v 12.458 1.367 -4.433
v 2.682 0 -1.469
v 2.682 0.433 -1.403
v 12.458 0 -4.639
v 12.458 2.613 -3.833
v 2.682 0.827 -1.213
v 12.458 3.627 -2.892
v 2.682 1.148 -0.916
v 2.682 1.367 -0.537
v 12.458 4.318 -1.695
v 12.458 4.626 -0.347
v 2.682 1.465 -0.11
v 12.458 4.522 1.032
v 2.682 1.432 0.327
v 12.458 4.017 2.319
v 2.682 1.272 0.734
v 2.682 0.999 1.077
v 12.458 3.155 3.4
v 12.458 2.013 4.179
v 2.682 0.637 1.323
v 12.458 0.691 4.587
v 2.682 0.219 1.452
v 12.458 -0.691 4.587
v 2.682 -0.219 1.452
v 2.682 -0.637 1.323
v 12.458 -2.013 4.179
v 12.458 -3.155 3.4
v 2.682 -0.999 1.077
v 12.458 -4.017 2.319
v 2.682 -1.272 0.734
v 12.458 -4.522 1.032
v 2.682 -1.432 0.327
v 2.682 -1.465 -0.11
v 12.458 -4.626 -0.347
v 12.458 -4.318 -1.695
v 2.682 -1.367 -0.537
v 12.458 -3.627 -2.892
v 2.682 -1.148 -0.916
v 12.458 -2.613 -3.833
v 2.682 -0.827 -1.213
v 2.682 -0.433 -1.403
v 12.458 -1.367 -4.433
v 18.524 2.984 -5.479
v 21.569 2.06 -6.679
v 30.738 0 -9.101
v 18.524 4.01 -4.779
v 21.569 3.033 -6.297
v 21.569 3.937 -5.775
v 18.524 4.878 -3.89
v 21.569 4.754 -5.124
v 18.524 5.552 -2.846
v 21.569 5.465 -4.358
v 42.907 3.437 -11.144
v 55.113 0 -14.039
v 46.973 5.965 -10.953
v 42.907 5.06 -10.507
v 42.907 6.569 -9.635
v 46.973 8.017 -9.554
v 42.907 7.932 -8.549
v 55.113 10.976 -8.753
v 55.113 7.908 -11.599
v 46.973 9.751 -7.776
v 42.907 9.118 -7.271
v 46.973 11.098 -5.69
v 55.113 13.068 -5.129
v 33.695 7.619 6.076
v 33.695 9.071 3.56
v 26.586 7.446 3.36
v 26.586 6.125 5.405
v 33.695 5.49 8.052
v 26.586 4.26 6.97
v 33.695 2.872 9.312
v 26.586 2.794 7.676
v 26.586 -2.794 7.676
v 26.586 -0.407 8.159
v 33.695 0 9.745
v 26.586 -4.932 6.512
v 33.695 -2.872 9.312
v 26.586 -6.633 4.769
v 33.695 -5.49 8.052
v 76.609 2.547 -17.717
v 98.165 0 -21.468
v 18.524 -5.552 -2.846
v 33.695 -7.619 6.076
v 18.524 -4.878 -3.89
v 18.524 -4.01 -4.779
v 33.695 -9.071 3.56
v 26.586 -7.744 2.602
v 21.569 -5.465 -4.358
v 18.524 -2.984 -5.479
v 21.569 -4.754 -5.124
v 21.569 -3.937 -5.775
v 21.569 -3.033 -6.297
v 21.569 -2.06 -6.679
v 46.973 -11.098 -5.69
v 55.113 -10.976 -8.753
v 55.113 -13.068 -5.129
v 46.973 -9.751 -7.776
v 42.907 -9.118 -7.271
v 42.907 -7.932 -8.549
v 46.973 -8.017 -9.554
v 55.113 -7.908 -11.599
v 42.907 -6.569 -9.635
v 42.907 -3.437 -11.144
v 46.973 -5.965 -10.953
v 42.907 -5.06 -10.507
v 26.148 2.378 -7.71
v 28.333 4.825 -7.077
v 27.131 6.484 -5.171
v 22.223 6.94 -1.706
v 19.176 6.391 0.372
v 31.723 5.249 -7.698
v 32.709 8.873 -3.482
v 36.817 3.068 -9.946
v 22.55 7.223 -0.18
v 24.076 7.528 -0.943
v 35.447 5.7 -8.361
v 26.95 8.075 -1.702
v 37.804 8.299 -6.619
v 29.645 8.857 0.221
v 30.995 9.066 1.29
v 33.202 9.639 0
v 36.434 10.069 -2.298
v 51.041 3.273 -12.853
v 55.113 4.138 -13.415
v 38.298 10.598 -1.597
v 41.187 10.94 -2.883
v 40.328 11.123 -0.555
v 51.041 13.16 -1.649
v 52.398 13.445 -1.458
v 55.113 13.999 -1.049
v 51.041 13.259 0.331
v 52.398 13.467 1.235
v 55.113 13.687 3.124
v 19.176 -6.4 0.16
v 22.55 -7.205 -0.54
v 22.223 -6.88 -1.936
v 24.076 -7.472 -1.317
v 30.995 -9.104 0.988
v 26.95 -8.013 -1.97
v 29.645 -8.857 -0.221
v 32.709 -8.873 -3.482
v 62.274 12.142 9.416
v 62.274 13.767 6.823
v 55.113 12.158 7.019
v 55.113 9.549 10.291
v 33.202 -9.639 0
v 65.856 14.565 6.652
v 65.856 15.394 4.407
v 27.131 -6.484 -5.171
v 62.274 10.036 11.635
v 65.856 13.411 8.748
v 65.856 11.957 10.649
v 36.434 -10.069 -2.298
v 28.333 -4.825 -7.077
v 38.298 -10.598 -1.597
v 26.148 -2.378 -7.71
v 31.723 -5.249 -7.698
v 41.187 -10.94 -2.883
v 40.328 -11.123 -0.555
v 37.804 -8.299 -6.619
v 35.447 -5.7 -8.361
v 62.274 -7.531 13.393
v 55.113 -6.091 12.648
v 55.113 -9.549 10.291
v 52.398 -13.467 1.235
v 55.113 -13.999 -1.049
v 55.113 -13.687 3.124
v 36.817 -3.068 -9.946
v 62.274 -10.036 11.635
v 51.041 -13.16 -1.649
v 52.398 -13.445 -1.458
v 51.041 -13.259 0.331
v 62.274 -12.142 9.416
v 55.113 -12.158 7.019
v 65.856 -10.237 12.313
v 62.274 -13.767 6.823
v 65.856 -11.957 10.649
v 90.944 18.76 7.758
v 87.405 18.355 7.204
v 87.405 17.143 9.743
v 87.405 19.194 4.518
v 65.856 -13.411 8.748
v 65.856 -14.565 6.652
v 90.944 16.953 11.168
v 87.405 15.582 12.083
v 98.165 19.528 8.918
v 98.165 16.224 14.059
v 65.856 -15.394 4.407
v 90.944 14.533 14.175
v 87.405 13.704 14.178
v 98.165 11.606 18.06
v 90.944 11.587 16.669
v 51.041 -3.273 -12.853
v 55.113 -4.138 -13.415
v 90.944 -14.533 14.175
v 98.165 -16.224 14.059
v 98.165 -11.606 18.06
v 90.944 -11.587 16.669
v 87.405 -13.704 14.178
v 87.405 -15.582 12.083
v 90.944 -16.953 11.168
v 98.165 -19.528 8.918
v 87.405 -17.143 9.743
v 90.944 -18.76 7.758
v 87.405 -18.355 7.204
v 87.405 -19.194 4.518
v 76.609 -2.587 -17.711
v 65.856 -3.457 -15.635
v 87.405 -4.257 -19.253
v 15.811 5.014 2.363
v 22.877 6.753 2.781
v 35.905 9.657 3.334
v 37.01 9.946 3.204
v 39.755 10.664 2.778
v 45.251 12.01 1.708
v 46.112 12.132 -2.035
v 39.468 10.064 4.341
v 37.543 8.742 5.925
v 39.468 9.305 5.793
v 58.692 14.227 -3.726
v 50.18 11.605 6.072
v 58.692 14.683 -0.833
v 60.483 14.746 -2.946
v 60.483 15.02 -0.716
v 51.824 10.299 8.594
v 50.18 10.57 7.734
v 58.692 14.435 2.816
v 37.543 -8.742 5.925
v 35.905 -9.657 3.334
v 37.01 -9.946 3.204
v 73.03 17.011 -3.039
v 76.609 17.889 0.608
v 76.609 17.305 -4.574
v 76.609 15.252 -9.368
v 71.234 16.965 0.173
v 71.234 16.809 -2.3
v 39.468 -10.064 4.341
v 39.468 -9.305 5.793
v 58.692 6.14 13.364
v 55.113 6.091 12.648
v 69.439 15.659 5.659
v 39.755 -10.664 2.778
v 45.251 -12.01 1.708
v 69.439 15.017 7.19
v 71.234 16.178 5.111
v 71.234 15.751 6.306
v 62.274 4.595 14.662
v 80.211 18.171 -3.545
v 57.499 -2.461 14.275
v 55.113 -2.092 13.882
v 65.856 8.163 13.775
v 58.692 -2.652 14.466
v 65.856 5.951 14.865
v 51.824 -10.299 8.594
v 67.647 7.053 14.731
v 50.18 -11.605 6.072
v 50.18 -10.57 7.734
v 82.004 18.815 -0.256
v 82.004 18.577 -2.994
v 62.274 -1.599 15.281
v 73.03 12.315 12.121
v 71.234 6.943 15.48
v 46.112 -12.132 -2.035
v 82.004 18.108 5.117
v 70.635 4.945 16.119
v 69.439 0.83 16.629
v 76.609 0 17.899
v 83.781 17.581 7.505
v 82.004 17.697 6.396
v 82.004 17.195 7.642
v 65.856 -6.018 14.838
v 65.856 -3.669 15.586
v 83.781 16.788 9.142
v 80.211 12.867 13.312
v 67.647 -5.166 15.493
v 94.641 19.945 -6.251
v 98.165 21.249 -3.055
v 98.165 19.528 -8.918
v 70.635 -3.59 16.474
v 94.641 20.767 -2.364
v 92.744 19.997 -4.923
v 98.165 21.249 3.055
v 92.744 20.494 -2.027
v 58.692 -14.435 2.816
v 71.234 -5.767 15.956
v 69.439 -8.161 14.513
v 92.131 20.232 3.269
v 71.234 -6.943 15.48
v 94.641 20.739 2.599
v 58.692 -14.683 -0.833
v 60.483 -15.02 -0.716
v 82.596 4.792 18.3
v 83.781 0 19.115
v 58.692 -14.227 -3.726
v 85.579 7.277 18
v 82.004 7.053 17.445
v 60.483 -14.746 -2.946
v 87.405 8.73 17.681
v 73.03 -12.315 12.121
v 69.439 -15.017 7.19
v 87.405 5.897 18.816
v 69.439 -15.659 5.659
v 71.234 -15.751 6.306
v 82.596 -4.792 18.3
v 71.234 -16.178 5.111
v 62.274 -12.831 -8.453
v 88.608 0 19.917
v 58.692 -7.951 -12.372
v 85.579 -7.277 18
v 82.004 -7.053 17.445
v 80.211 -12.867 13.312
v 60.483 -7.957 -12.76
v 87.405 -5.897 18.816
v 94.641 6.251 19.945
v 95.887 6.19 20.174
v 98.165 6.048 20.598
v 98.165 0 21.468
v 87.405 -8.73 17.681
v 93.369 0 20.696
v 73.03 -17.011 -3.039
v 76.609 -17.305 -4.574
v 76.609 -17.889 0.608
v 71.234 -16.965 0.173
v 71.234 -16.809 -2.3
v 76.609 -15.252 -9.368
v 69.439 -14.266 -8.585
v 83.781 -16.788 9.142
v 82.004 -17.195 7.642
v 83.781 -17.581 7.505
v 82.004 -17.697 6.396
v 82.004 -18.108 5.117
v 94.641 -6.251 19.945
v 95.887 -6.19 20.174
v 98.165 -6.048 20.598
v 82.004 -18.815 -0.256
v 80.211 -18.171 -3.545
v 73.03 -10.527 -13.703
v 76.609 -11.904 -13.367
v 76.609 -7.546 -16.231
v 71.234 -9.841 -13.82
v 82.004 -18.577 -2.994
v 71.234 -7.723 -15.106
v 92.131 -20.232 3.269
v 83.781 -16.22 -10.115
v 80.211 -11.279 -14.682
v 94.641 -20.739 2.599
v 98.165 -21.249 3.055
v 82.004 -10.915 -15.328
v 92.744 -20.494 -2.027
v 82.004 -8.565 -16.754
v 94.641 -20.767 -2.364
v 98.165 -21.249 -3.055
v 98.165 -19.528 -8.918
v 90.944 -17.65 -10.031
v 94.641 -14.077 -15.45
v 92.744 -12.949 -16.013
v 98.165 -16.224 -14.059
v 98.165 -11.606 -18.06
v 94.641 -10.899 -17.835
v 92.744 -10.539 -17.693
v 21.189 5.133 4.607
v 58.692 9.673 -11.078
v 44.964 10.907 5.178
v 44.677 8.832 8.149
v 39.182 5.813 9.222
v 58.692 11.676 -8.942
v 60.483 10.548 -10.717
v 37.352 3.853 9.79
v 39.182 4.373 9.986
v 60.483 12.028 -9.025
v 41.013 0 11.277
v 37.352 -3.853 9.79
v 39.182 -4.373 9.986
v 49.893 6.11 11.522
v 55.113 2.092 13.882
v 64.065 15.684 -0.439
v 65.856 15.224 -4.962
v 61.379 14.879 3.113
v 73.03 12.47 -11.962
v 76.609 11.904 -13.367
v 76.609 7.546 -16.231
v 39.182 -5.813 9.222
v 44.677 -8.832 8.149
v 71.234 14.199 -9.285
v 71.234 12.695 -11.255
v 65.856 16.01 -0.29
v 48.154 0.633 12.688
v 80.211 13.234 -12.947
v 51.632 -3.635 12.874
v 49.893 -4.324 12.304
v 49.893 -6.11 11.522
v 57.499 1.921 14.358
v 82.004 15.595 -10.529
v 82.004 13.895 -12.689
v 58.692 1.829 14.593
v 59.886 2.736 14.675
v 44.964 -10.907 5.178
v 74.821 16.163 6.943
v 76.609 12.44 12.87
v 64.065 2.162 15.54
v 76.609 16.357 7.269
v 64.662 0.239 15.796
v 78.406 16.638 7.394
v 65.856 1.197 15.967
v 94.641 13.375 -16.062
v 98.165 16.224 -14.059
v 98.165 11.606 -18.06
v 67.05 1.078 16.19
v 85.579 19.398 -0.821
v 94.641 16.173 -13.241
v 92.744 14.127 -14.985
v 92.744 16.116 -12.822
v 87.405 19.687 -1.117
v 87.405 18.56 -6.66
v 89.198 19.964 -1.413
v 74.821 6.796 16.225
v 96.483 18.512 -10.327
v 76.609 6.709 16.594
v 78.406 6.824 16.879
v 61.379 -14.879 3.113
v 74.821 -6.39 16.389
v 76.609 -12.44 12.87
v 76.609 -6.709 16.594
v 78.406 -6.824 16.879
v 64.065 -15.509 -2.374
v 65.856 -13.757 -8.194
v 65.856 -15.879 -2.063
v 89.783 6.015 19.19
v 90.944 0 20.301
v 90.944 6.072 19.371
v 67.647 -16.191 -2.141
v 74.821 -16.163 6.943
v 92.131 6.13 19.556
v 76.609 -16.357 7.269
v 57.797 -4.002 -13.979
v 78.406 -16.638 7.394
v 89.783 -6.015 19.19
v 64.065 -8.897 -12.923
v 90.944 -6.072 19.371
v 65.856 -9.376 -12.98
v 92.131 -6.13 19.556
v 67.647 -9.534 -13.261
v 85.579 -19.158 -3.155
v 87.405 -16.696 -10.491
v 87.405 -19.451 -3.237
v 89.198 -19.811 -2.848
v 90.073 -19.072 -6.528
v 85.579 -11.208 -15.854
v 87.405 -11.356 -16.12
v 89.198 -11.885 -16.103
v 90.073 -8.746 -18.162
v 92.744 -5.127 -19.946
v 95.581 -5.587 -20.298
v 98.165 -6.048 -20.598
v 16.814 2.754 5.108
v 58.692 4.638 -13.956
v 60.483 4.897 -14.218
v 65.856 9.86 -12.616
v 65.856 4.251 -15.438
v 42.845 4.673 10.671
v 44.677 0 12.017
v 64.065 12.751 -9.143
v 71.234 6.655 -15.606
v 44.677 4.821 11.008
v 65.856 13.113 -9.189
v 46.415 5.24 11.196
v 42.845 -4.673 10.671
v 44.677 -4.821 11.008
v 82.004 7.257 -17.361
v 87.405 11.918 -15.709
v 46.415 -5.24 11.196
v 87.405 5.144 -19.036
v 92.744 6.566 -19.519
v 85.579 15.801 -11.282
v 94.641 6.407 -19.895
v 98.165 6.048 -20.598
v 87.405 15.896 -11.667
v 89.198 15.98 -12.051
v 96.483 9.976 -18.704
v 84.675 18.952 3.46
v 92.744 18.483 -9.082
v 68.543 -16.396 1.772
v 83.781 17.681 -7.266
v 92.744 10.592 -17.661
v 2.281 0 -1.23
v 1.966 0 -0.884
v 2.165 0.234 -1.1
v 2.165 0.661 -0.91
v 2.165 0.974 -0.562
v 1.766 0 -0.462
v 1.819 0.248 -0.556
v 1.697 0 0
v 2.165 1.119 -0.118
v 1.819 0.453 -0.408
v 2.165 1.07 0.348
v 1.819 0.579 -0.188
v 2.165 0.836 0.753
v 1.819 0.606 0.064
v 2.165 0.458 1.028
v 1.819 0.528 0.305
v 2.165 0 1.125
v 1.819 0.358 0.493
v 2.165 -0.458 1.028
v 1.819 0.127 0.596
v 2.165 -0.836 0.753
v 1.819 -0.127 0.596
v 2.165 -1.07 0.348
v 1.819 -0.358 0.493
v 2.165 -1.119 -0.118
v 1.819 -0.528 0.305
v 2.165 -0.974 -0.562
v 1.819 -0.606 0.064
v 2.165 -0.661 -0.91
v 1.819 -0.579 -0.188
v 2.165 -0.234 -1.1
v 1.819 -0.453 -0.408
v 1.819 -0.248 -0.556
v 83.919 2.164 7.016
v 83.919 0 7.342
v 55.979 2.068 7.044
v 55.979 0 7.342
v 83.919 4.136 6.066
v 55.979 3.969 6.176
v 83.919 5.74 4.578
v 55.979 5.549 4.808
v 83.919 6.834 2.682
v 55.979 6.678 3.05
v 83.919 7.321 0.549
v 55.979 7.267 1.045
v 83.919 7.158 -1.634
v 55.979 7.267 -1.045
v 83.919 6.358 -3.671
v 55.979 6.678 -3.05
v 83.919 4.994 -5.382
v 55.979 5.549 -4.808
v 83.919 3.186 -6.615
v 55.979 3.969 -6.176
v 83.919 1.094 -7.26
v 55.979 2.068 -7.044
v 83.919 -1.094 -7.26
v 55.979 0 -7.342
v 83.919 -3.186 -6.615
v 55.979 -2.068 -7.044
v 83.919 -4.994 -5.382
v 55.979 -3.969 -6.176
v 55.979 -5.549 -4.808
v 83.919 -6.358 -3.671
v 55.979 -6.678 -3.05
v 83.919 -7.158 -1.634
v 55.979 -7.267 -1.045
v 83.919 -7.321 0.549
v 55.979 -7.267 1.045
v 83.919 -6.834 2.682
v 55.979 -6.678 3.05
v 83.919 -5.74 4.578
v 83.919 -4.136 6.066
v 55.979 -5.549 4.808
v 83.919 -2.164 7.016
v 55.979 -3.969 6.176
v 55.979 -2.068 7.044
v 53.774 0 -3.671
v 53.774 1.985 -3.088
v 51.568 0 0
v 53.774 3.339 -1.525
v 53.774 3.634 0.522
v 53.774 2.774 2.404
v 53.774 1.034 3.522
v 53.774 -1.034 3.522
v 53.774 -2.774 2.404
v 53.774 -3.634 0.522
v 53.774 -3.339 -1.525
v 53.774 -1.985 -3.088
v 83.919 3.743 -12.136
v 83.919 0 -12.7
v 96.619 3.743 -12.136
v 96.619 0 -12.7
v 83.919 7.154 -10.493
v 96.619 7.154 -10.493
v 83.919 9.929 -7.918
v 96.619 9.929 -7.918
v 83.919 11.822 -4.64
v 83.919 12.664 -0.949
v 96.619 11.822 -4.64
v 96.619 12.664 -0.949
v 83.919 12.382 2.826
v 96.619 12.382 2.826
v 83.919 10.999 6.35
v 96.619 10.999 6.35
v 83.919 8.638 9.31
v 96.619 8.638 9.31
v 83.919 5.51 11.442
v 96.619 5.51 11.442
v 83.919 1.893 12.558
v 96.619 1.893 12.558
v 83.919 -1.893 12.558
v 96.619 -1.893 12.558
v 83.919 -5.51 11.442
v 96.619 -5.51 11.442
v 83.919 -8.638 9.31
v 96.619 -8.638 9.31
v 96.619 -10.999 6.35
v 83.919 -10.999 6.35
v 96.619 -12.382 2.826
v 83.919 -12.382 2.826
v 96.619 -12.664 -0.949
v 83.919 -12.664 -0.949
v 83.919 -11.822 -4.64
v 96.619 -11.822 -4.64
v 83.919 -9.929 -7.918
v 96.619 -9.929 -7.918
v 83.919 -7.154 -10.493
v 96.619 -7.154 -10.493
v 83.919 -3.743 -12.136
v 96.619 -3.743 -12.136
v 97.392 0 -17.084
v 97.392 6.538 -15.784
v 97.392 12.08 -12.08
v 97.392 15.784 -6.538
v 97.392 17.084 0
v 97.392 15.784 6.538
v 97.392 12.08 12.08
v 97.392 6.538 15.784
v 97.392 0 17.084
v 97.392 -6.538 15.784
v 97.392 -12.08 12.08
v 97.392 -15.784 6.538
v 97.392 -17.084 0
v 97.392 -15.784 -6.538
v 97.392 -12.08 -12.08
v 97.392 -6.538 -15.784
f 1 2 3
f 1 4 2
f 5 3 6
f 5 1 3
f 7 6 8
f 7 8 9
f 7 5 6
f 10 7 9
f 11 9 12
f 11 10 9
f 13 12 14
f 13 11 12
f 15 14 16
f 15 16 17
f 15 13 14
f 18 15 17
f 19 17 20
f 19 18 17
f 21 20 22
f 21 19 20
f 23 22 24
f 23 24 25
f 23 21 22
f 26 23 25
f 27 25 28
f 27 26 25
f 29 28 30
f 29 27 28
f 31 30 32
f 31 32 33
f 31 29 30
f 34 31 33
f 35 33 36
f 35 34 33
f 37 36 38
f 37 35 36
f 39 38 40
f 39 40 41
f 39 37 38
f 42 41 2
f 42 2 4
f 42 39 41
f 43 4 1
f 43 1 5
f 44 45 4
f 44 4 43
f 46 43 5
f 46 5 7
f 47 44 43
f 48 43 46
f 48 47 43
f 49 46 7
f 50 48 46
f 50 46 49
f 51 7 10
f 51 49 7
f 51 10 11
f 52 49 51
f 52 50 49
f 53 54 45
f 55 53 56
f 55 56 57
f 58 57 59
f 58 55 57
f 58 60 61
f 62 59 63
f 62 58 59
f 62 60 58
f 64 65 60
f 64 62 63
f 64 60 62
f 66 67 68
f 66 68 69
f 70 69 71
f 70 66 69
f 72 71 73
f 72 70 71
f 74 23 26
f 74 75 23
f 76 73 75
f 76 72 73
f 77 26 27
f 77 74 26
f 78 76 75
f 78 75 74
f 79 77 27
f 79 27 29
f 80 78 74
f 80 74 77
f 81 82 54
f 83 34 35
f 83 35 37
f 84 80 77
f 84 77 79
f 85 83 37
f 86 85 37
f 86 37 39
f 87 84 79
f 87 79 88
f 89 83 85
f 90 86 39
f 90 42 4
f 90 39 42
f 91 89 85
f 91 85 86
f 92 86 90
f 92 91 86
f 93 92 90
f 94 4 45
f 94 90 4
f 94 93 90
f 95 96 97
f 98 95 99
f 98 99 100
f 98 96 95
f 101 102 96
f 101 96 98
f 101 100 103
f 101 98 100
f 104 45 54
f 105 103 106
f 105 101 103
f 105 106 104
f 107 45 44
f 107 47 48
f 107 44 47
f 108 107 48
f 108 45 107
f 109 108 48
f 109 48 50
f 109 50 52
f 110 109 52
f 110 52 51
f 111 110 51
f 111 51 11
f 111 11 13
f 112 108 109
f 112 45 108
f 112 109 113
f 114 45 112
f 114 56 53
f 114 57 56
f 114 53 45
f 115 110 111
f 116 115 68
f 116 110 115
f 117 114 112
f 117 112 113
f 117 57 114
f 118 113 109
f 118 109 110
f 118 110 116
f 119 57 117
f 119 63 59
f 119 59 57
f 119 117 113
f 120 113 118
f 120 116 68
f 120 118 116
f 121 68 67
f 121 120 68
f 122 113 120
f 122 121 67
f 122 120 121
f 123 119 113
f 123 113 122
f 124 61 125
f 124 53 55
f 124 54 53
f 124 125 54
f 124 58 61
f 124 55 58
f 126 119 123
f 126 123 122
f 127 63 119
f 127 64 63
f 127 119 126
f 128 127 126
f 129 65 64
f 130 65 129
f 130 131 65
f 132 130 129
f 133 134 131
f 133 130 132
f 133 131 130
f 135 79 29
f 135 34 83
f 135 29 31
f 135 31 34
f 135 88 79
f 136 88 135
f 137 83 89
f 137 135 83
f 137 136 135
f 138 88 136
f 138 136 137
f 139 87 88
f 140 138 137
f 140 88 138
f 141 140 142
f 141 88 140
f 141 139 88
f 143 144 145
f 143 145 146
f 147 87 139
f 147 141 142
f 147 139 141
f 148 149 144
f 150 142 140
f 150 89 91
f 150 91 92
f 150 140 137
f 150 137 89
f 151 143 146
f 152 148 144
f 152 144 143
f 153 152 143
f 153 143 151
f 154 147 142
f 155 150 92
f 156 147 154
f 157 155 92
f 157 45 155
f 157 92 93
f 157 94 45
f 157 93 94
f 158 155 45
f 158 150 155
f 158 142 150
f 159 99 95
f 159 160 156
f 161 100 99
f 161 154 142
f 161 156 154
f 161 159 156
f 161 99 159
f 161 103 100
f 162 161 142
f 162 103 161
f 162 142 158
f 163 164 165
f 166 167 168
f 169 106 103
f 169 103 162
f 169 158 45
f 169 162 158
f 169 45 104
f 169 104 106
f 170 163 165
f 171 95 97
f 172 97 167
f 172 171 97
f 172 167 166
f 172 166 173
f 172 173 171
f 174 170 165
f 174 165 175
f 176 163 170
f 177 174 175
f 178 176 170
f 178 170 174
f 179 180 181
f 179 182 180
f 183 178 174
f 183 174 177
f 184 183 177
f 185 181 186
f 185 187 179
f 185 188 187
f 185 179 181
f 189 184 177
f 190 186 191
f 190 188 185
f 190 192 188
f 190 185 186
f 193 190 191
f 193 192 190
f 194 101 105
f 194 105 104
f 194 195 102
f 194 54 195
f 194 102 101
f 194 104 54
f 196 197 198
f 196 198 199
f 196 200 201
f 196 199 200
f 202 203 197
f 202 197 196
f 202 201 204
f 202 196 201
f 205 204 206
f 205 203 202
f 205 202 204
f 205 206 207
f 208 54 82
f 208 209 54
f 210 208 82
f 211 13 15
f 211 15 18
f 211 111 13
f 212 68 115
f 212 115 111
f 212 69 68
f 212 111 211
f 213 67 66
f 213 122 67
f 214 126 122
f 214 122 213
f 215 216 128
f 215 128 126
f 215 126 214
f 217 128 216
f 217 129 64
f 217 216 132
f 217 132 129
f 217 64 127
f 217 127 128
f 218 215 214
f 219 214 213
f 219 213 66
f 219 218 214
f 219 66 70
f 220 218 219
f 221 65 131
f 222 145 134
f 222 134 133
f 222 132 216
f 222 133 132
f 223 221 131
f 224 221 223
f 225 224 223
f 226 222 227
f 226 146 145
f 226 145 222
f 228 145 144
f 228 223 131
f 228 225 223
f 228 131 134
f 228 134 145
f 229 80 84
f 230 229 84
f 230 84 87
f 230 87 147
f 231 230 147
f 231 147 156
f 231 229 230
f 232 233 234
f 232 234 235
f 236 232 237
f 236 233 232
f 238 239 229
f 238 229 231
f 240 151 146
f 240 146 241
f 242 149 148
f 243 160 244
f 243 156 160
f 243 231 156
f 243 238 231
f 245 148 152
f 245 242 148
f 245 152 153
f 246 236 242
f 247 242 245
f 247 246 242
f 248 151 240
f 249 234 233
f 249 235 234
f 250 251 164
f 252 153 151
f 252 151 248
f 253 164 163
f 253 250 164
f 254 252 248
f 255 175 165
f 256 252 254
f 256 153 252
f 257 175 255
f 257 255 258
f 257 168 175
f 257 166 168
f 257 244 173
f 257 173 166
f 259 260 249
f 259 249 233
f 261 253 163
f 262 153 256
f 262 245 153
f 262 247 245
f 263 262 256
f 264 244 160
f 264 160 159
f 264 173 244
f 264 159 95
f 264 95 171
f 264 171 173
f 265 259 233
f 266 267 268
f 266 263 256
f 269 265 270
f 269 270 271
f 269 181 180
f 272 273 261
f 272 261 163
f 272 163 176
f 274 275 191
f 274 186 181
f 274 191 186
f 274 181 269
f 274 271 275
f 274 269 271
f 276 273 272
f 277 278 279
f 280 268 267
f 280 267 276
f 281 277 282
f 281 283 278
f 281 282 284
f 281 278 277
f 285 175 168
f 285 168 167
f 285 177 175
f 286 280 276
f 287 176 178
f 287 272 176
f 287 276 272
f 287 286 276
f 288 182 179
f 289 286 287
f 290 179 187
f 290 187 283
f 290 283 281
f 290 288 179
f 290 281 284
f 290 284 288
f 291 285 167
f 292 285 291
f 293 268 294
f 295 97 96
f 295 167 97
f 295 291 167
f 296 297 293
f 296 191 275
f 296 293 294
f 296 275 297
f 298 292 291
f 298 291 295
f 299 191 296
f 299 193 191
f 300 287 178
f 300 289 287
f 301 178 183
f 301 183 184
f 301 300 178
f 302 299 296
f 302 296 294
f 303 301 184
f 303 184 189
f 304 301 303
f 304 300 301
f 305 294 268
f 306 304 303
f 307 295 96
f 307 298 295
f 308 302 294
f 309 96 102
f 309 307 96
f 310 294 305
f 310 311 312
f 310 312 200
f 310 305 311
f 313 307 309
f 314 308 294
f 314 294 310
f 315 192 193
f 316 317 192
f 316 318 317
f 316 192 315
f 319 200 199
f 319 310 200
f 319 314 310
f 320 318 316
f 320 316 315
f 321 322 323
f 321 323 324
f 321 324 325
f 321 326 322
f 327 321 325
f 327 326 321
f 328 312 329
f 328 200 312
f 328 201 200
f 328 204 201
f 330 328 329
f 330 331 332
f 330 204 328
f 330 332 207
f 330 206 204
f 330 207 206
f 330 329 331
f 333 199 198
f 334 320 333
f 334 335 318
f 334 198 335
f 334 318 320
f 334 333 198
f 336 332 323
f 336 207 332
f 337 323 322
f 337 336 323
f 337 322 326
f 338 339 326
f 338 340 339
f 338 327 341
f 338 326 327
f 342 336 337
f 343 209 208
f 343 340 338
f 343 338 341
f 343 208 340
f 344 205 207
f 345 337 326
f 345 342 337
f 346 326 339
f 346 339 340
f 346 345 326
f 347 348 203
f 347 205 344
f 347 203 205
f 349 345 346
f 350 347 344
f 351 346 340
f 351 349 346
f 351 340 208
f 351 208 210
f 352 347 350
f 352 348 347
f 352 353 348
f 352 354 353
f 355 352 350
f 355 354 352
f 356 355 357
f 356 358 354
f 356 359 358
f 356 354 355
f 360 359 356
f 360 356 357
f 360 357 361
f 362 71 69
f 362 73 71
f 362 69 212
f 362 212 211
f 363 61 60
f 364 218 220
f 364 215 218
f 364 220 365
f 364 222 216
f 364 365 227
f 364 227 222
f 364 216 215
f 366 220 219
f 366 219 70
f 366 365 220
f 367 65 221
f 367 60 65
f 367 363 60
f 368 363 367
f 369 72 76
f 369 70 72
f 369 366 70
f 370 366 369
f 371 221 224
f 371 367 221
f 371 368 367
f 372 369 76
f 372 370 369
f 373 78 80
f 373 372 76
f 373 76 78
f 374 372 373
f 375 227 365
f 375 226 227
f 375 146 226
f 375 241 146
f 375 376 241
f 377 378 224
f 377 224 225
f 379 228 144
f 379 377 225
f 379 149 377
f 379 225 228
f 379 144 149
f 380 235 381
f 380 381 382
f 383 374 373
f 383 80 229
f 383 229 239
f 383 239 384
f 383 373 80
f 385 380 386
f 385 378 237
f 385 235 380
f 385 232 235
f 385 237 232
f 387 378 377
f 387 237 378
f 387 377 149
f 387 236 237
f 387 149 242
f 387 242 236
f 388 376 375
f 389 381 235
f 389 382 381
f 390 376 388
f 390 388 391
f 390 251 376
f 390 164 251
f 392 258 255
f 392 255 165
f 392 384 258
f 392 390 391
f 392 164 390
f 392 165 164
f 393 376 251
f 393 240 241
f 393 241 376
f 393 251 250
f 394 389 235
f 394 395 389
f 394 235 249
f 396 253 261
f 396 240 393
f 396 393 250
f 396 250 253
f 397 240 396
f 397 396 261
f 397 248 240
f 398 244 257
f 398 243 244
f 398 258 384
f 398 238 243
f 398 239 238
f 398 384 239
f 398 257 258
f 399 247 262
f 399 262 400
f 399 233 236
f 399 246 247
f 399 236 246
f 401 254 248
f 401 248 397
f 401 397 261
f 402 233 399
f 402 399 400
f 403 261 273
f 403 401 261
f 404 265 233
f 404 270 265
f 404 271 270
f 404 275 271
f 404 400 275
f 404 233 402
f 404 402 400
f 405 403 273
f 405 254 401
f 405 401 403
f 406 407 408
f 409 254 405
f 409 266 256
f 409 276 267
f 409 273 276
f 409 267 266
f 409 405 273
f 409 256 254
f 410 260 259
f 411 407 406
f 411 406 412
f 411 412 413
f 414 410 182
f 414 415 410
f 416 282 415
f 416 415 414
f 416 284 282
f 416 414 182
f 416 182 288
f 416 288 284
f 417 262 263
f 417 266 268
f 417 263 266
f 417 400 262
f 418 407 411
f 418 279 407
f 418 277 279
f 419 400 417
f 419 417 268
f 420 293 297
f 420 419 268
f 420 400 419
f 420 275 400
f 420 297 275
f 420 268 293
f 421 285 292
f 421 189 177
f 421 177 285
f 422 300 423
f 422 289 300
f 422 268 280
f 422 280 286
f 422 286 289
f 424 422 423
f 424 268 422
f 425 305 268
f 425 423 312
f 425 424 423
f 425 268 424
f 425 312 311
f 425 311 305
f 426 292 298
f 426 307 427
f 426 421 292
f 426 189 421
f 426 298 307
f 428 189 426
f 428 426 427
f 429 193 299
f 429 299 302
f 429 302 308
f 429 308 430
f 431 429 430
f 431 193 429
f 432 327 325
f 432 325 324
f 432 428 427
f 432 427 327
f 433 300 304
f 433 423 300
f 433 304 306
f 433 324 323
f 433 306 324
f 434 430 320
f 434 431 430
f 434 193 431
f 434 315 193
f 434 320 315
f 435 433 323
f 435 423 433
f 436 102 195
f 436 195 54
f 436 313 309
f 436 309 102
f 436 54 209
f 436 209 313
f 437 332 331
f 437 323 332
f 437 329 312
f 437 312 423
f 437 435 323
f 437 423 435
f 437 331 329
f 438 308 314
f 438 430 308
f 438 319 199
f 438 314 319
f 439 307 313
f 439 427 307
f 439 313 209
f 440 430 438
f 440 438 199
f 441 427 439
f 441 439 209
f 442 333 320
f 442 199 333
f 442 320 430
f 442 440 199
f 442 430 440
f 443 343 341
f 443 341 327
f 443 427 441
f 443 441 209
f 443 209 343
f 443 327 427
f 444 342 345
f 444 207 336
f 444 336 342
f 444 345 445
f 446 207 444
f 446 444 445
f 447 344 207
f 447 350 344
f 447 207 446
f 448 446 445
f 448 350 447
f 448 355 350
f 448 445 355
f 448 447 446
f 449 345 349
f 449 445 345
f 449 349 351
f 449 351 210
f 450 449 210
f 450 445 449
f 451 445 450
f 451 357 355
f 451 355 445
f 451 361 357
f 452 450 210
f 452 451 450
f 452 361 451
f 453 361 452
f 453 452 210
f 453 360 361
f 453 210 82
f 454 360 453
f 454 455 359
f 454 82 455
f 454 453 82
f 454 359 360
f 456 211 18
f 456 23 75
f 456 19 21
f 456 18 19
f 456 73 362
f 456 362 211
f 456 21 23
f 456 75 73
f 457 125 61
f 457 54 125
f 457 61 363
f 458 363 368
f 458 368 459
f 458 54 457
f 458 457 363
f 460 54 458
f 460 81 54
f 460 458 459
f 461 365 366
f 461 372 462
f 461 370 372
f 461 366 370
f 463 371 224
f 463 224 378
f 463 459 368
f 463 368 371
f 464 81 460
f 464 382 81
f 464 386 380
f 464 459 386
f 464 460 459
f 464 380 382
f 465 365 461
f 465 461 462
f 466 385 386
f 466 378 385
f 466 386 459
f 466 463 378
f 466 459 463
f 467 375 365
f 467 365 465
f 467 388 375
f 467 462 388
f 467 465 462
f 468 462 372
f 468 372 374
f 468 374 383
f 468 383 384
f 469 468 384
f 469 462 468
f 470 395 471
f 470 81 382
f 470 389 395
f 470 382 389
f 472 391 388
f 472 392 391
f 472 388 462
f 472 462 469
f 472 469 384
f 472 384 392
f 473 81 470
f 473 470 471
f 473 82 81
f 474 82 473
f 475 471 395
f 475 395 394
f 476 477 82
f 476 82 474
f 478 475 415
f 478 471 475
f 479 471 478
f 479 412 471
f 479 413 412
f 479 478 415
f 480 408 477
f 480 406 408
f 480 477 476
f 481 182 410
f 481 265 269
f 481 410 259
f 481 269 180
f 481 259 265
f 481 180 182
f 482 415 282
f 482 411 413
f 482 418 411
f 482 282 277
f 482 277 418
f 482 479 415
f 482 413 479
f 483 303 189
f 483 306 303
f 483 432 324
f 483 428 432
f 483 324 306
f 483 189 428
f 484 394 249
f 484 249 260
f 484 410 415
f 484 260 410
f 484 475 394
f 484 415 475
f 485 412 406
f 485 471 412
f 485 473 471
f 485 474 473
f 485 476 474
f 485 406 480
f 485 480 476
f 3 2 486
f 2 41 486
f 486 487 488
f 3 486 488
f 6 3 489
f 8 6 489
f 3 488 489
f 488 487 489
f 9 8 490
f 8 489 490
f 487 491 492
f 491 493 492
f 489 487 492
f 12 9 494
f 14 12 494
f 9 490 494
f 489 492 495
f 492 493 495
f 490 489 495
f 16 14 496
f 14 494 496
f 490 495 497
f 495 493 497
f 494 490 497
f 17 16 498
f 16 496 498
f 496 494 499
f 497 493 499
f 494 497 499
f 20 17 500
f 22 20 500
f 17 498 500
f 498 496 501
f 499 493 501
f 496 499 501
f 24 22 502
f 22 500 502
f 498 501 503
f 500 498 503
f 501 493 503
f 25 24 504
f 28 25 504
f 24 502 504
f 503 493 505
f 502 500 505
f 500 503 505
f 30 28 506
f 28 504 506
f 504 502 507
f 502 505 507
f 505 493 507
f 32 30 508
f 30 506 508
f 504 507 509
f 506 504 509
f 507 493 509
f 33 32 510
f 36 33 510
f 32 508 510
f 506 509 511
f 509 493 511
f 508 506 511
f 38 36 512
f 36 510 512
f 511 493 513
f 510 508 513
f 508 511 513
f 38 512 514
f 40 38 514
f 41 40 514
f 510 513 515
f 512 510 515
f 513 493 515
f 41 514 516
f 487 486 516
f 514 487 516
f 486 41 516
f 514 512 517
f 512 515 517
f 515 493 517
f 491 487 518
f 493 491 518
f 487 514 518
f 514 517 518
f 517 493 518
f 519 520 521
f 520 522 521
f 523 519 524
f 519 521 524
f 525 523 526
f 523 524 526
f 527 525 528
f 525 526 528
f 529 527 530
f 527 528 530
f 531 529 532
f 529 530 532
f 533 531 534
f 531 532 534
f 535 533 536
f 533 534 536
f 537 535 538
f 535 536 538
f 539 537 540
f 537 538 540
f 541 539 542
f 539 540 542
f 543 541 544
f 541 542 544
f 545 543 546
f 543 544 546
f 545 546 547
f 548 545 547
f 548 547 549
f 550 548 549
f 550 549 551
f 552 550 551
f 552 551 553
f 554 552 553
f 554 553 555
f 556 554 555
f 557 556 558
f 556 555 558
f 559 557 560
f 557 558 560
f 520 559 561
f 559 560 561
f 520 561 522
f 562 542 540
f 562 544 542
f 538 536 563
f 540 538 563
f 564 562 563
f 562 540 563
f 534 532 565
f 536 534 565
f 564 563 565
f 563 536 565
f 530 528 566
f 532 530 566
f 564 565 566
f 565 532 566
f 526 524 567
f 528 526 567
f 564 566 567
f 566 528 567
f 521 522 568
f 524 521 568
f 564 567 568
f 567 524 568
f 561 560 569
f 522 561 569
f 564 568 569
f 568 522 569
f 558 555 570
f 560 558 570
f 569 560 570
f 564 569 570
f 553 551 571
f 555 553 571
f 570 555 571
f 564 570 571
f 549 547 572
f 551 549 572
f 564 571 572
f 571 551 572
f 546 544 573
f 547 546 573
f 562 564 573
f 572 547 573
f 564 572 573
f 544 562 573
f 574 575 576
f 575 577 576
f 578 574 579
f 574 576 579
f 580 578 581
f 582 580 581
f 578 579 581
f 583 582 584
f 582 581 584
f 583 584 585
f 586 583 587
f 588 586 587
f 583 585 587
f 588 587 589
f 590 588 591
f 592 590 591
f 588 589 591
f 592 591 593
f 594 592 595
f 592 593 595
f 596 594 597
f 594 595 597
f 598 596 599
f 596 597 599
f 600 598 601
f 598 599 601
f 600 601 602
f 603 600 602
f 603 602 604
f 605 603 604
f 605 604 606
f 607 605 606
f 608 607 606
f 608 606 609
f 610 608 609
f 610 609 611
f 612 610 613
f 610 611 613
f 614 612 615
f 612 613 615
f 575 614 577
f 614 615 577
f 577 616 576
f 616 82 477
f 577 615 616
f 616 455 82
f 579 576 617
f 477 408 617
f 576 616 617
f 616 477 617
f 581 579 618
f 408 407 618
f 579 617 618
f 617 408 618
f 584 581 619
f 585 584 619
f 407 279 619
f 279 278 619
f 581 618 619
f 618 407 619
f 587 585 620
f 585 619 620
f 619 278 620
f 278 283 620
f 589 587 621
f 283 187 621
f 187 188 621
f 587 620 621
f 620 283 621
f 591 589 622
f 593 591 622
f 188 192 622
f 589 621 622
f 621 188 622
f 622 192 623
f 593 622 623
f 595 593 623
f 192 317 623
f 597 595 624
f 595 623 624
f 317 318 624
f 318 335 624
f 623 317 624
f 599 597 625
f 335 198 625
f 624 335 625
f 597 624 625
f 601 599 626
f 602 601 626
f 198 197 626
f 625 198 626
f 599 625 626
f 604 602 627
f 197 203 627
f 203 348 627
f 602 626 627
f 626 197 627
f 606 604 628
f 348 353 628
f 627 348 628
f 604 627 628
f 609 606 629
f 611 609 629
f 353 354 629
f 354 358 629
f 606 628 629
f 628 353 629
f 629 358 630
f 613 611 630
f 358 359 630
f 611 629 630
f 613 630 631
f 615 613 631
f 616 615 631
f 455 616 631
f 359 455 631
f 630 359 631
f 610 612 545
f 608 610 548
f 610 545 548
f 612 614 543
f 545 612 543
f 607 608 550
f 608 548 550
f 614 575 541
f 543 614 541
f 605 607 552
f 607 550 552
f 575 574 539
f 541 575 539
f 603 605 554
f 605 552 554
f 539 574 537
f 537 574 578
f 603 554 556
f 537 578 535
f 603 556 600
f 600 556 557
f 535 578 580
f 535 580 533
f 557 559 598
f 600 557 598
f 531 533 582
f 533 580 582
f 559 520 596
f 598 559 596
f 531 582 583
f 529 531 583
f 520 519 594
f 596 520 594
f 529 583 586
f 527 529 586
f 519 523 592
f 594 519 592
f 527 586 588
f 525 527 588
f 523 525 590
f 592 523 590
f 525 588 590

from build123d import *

# Parameters (mm, degrees)
TAPPED_HOLE_FOR_9_16_12_HELICOIL1_D     = 14.68374
TAPPED_HOLE_FOR_9_16_12_HELICOIL1_DEPTH = 27.94
TAPPED_HOLE_FOR_9_16_12_HELICOIL1_TIP   = 4.411440553


with BuildPart() as part:
    # Sketch1 → Revolve2 (revolve)
    with BuildSketch(Plane(origin=(0, 0, 0), x_dir=(1, 0, 0), z_dir=(0, 1, 0))):
        with BuildLine():
            Line((1.697321091, 0), (45.819405393, 0))
            Line((45.819405393, 0), (83.919405393, 0))
            Line((83.919405393, 0), (83.919405393, 7.68858))
            Line((83.919405393, 7.68858), (83.919405393, 12.7))
            Line((83.919405393, 12.7), (96.619405393, 12.7))
            Line((96.619405393, 12.7), (98.165428581, 21.4679332))
            add(Edge.make_bspline(
                [(2.682127148, 1.468644362), (2.982092127, 1.591742283), (3.982765764, 1.986976913), (6.075542743, 2.735585346), (9.959285205, 3.961402854), (15.35260807, 5.458934046), (21.847317263, 7.086678944), (29.055363889, 8.749177841), (36.286920774, 10.313744718), (43.531901048, 11.801111844), (50.793776988, 13.226984496), (58.058153921, 14.599266319), (64.433980883, 15.762645369), (69.883896781, 16.732062359), (74.459068804, 17.529825957), (78.065425347, 18.150661812), (81.784961377, 18.781283529), (85.307065103, 19.372441088), (89.168740248, 20.010357493), (92.45838759, 20.54964543), (95.664328261, 21.067043036), (97.333372349, 21.334925019), (98.164963492, 21.467858845), (98.165428581, 21.4679332)],
                knots=[0.027847292, 0.027847292, 0.027847292, 0.027847292, 0.027847292, 0.039565322, 0.06672611, 0.108155752, 0.174993972, 0.2418322, 0.308670423, 0.375508647, 0.442346873, 0.509185099, 0.576023325, 0.642861549, 0.676280662, 0.709699776, 0.743118888, 0.776538001, 0.809957114, 0.843376227, 0.87679534, 0.910214452, 0.910233153, 0.910233153, 0.910233153, 0.910233153, 0.910233153], degree=4))
            ThreePointArc((2.682127148, 1.468644362), (1.966311917, 0.884132234), (1.697321091, 0))
        make_face()
    revolve(axis=Axis((0, 0, 0), (1, 0, 0)))

    # Tapped Hole for 9/16-12 Helicoil1
    with Locations(Plane(origin=(83.919405393, 0, 0), x_dir=(0, 0, -1), z_dir=(1, 0, 0))):
        with Locations((0, 0)):
            Hole(TAPPED_HOLE_FOR_9_16_12_HELICOIL1_D / 2, depth=TAPPED_HOLE_FOR_9_16_12_HELICOIL1_DEPTH)
            with Locations((0, 0, -(TAPPED_HOLE_FOR_9_16_12_HELICOIL1_DEPTH + TAPPED_HOLE_FOR_9_16_12_HELICOIL1_TIP / 2))):  # 118° drill point
                Cone(0, TAPPED_HOLE_FOR_9_16_12_HELICOIL1_D / 2, TAPPED_HOLE_FOR_9_16_12_HELICOIL1_TIP, mode=Mode.SUBTRACT)


solid = part.part
